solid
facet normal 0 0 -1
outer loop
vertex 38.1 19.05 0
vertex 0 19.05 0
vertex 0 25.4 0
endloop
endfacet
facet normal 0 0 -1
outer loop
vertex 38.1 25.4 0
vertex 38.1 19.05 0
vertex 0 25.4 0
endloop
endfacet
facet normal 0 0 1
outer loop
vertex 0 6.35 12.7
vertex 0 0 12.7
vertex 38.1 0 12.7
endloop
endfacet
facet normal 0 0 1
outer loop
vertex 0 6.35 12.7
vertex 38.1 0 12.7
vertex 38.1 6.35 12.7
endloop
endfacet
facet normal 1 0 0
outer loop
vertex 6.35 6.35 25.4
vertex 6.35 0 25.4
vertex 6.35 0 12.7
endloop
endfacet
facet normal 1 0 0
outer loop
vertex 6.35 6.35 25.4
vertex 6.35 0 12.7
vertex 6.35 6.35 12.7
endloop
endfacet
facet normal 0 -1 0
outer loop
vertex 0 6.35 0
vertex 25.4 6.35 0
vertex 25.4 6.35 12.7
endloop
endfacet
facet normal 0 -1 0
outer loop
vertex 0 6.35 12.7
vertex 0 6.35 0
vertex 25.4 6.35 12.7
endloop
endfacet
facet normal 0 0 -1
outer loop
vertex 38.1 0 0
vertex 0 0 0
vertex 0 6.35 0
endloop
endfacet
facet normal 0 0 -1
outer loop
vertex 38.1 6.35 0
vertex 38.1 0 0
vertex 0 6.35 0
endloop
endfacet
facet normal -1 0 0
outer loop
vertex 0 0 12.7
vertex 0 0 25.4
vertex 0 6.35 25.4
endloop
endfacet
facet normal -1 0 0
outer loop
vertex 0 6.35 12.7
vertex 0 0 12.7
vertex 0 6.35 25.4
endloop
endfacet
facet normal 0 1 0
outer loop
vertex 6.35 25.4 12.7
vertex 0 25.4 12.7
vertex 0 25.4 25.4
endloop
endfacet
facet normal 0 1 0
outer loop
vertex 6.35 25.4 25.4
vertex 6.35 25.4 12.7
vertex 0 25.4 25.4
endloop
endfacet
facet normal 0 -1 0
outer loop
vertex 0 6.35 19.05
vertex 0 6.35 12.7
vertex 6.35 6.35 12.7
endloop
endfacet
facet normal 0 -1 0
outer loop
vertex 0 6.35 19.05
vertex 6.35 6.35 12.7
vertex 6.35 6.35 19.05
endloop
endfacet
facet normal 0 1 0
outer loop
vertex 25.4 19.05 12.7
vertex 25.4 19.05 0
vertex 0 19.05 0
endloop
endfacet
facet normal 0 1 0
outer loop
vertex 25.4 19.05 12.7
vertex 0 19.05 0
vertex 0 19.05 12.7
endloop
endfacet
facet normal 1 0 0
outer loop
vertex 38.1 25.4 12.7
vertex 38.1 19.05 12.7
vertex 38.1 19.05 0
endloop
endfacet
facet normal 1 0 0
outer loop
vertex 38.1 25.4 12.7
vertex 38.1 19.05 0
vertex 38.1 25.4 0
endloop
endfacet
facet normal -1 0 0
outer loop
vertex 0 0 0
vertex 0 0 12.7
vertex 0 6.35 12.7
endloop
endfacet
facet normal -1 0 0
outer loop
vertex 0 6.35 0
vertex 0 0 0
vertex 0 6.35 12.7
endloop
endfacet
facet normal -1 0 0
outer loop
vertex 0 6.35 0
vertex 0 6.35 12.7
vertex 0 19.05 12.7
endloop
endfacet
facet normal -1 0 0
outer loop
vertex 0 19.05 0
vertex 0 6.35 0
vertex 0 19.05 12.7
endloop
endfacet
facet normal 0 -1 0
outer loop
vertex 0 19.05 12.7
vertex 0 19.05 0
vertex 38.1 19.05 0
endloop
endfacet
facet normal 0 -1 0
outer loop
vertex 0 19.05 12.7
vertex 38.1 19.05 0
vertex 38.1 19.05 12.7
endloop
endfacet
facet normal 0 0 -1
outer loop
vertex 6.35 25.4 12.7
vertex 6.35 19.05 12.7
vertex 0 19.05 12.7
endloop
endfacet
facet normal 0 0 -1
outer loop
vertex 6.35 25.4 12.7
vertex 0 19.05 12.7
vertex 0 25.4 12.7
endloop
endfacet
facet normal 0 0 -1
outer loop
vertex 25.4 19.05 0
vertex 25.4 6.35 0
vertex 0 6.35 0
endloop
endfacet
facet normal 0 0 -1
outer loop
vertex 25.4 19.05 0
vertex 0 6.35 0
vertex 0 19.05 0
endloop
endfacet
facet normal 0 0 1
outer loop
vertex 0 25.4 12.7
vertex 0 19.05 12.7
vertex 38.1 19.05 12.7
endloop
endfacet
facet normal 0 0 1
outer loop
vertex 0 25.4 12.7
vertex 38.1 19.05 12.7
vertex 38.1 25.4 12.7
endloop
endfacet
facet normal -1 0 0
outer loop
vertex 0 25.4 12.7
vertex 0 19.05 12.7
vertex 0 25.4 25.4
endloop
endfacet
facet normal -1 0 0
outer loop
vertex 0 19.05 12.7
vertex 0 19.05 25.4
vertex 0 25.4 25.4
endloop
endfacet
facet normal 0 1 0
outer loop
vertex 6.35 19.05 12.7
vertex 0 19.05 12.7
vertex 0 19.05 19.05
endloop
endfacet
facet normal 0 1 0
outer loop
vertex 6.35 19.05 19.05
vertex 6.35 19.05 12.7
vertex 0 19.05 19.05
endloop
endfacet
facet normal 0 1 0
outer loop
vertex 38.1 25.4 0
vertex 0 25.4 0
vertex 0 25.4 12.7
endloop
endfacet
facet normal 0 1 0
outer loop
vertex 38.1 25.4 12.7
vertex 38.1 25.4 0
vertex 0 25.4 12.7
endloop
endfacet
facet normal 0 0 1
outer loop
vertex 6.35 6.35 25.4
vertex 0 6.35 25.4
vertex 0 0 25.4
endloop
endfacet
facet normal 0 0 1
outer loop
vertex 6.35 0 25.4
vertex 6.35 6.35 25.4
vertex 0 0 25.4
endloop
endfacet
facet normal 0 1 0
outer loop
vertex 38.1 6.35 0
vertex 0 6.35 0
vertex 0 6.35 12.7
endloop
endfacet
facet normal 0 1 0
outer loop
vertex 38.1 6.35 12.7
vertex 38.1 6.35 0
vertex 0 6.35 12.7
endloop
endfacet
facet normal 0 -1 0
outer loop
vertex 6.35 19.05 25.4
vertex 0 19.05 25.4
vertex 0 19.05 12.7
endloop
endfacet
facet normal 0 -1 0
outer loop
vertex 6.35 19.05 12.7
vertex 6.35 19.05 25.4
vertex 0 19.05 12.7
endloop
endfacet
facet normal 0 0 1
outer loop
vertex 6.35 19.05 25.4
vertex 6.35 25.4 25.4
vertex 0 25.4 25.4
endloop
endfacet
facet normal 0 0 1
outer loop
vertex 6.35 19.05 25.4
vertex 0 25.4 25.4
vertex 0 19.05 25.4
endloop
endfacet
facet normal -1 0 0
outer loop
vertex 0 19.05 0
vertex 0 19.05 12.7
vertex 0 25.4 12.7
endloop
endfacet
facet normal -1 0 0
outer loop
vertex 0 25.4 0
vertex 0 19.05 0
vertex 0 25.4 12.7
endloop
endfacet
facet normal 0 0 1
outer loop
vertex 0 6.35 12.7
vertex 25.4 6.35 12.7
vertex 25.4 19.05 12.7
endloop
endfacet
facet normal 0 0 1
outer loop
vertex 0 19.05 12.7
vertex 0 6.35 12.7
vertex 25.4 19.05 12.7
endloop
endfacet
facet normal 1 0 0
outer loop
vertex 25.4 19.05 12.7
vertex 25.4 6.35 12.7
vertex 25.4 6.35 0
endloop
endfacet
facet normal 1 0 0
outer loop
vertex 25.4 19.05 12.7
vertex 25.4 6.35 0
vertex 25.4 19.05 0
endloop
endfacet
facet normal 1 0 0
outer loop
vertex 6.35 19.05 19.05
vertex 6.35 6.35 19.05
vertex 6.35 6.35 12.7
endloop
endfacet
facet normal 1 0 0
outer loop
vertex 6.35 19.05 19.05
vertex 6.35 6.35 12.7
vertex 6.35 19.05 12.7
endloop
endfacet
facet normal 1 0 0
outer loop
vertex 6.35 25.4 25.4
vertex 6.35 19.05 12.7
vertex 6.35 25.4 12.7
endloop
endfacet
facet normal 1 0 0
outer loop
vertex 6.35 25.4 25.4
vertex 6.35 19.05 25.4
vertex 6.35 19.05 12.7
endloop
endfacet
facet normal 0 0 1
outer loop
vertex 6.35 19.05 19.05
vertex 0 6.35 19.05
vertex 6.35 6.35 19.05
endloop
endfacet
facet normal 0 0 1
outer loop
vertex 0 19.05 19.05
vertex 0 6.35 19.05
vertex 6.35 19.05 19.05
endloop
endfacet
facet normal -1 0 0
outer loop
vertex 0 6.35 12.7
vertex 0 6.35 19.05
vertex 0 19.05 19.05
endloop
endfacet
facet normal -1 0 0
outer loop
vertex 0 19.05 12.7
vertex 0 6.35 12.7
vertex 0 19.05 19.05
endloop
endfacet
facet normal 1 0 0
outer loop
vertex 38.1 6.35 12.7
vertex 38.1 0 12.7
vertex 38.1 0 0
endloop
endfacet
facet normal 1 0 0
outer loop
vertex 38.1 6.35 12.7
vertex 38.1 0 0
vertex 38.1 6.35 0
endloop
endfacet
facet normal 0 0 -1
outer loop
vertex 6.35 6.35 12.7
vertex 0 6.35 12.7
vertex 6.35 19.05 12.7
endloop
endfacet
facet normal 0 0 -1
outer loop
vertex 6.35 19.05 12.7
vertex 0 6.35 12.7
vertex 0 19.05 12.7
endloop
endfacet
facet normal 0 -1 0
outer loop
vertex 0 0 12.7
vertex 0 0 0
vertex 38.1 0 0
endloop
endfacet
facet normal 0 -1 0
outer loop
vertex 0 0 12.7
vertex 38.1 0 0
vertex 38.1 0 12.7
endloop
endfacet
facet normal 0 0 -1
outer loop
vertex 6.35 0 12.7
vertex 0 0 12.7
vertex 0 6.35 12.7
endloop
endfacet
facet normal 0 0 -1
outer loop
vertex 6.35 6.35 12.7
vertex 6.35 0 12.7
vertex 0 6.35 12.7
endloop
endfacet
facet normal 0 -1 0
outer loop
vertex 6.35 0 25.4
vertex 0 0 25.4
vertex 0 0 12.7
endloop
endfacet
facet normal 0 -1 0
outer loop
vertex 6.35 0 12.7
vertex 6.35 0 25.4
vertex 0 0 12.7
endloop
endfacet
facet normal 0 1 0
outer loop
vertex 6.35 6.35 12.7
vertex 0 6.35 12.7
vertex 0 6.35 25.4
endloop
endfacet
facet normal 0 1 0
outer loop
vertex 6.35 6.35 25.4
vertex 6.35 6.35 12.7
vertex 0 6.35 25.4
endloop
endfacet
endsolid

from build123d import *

# Parameters (mm, degrees)
F0_W     = 6.35
F0_H     = 12.7
F1_DEPTH = 38.1
F0_W_2   = 12.7
F2_DEPTH = 25.4
F3_DEPTH = 6.35
F0_H_2   = 6.35
F4_DEPTH = 6.35


with BuildPart() as f1:
    # F0 (on Right) → F1 (new body)
    with BuildSketch(Plane.YZ):
        with Locations((3.175, 6.35)):
            Rectangle(F0_W, F0_H)
        with Locations((22.225, 6.35)):
            Rectangle(F0_W, F0_H)
    extrude(amount=F1_DEPTH)


with BuildPart() as f2:
    # F0 (on Right) → F2 (new body)
    with BuildSketch(Plane.YZ):
        with Locations((12.7, 6.35)):
            Rectangle(F0_W_2, F0_H)
    extrude(amount=F2_DEPTH)


with BuildPart() as f3:
    # F0 (on Right) → F3 (new body)
    with BuildSketch(Plane.YZ):
        Polygon((0, 25.4), (0, 12.7), (6.35, 12.7), (6.35, 19.05), (6.35, 25.4), align=None)
        Polygon((19.05, 19.05), (19.05, 12.7), (25.4, 12.7), (25.4, 25.4), (19.05, 25.4), align=None)
    extrude(amount=F3_DEPTH)


with BuildPart() as f4:
    # F0 (on Right) → F4 (new body)
    with BuildSketch(Plane.YZ):
        with Locations((12.7, 15.875)):
            Rectangle(F0_W_2, F0_H_2)
    extrude(amount=F4_DEPTH)


solid = Compound([f1.part, f2.part, f3.part, f4.part])
